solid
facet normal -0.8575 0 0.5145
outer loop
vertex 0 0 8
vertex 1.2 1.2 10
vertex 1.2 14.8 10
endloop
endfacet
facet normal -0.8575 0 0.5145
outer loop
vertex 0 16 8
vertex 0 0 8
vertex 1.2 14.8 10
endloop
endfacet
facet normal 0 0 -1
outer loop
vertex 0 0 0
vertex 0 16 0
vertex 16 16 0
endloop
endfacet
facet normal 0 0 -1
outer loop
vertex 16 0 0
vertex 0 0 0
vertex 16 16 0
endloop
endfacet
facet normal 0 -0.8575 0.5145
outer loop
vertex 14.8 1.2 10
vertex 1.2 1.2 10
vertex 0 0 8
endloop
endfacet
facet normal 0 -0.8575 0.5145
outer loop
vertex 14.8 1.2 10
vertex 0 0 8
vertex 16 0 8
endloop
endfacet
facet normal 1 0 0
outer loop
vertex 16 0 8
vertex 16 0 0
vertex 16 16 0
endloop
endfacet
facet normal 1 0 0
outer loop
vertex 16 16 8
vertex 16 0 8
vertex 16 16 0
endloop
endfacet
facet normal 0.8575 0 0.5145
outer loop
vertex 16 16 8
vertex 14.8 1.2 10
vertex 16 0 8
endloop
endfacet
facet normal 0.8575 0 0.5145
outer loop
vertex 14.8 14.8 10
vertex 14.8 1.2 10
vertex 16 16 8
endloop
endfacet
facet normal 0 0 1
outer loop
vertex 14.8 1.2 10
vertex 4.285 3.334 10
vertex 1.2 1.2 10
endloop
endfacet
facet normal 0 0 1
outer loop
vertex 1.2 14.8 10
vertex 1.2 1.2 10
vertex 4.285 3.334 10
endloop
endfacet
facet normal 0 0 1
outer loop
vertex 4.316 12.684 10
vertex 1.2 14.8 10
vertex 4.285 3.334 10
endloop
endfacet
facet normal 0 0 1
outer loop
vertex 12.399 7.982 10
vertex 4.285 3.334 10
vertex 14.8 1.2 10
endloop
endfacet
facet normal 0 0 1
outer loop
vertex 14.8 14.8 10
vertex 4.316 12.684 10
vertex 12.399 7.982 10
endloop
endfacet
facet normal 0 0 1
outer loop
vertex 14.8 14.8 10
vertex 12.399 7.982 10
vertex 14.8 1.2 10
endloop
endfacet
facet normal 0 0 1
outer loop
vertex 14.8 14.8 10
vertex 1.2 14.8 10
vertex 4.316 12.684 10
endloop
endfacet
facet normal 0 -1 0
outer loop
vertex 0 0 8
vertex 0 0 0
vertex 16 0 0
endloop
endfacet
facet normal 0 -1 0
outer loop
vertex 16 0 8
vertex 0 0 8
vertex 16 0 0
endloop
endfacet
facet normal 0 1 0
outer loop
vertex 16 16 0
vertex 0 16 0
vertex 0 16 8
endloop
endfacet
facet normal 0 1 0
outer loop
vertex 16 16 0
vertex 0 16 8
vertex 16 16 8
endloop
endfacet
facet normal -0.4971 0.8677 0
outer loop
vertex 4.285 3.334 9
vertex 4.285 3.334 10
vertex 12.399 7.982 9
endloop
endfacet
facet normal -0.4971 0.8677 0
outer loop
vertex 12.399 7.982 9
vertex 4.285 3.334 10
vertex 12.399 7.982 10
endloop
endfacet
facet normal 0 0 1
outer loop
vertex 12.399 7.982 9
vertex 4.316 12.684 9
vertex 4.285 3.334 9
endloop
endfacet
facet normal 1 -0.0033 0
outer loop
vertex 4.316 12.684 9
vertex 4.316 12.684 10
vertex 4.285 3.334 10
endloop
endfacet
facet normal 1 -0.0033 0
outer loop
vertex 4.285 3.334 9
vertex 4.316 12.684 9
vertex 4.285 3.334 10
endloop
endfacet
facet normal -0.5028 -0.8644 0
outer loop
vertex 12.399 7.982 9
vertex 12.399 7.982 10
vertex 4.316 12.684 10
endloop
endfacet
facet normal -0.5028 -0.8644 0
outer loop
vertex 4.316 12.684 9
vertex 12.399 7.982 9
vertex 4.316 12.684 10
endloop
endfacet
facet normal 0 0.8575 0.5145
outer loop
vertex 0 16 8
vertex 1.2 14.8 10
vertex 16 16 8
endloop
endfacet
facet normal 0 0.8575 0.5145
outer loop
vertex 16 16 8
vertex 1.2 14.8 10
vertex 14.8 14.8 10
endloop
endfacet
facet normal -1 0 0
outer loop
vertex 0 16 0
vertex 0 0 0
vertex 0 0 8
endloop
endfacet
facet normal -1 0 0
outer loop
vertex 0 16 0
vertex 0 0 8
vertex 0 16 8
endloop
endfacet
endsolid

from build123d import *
from OCP.BRepFilletAPI import BRepFilletAPI_MakeChamfer

# Parameters (mm, degrees)
SKETCH1_W           = 16
SKETCH1_H           = 16
BOSS_EXTRUDE1_DEPTH = 10
CUT_EXTRUDE1_DEPTH  = 1
FILLET4_SIZE        = 2
FILLET4_SIZE2       = 1.2


with BuildPart() as part:
    # Sketch1 → Boss-Extrude1 (new body)
    with BuildSketch(Plane.XY):
        with Locations((8, 8)):
            Rectangle(SKETCH1_W, SKETCH1_H)
    extrude(amount=BOSS_EXTRUDE1_DEPTH)

    # Sketch2 → Cut-Extrude1 (cut)
    with BuildSketch(Plane.XY.offset(10)):
        Polygon((4.316390203, 12.684359808), (4.285030305, 3.333745838), (12.398579492, 7.981894354), align=None)
    extrude(amount=-CUT_EXTRUDE1_DEPTH, mode=Mode.SUBTRACT)

    # Fillet4: one chamfer whose edges measure the first distance from different faces: ONE call of the kernel's chamfer builder (chamfer() names one face for all edges)
    fillet4_edges_1 = [part.edges().sort_by_distance(p)[0] for p in [
        (16, 8, 10),
    ]]
    fillet4_side_1 = [part.faces().sort_by_distance(p)[0] for p in [
        (16, 8, 5),
    ]]
    fillet4_edges_2 = [part.edges().sort_by_distance(p)[0] for p in [
        (8, 16, 10),
    ]]
    fillet4_side_2 = [part.faces().sort_by_distance(p)[0] for p in [
        (8, 16, 5),
    ]]
    fillet4_edges_3 = [part.edges().sort_by_distance(p)[0] for p in [
        (0, 8, 10),
    ]]
    fillet4_side_3 = [part.faces().sort_by_distance(p)[0] for p in [
        (0, 8, 5),
    ]]
    fillet4_edges_4 = [part.edges().sort_by_distance(p)[0] for p in [
        (8, 0, 10),
    ]]
    fillet4_side_4 = [part.faces().sort_by_distance(p)[0] for p in [
        (8, 0, 5),
    ]]
    fillet4 = BRepFilletAPI_MakeChamfer(part.part.solid().wrapped)
    for e in fillet4_edges_1:
        fillet4.Add(FILLET4_SIZE, FILLET4_SIZE2, e.wrapped, fillet4_side_1[0].wrapped)  # the first distance lies on this face
    for e in fillet4_edges_2:
        fillet4.Add(FILLET4_SIZE, FILLET4_SIZE2, e.wrapped, fillet4_side_2[0].wrapped)  # the first distance lies on this face
    for e in fillet4_edges_3:
        fillet4.Add(FILLET4_SIZE, FILLET4_SIZE2, e.wrapped, fillet4_side_3[0].wrapped)  # the first distance lies on this face
    for e in fillet4_edges_4:
        fillet4.Add(FILLET4_SIZE, FILLET4_SIZE2, e.wrapped, fillet4_side_4[0].wrapped)  # the first distance lies on this face
    add(Compound.cast(fillet4.Shape()), mode=Mode.REPLACE)


solid = part.part
